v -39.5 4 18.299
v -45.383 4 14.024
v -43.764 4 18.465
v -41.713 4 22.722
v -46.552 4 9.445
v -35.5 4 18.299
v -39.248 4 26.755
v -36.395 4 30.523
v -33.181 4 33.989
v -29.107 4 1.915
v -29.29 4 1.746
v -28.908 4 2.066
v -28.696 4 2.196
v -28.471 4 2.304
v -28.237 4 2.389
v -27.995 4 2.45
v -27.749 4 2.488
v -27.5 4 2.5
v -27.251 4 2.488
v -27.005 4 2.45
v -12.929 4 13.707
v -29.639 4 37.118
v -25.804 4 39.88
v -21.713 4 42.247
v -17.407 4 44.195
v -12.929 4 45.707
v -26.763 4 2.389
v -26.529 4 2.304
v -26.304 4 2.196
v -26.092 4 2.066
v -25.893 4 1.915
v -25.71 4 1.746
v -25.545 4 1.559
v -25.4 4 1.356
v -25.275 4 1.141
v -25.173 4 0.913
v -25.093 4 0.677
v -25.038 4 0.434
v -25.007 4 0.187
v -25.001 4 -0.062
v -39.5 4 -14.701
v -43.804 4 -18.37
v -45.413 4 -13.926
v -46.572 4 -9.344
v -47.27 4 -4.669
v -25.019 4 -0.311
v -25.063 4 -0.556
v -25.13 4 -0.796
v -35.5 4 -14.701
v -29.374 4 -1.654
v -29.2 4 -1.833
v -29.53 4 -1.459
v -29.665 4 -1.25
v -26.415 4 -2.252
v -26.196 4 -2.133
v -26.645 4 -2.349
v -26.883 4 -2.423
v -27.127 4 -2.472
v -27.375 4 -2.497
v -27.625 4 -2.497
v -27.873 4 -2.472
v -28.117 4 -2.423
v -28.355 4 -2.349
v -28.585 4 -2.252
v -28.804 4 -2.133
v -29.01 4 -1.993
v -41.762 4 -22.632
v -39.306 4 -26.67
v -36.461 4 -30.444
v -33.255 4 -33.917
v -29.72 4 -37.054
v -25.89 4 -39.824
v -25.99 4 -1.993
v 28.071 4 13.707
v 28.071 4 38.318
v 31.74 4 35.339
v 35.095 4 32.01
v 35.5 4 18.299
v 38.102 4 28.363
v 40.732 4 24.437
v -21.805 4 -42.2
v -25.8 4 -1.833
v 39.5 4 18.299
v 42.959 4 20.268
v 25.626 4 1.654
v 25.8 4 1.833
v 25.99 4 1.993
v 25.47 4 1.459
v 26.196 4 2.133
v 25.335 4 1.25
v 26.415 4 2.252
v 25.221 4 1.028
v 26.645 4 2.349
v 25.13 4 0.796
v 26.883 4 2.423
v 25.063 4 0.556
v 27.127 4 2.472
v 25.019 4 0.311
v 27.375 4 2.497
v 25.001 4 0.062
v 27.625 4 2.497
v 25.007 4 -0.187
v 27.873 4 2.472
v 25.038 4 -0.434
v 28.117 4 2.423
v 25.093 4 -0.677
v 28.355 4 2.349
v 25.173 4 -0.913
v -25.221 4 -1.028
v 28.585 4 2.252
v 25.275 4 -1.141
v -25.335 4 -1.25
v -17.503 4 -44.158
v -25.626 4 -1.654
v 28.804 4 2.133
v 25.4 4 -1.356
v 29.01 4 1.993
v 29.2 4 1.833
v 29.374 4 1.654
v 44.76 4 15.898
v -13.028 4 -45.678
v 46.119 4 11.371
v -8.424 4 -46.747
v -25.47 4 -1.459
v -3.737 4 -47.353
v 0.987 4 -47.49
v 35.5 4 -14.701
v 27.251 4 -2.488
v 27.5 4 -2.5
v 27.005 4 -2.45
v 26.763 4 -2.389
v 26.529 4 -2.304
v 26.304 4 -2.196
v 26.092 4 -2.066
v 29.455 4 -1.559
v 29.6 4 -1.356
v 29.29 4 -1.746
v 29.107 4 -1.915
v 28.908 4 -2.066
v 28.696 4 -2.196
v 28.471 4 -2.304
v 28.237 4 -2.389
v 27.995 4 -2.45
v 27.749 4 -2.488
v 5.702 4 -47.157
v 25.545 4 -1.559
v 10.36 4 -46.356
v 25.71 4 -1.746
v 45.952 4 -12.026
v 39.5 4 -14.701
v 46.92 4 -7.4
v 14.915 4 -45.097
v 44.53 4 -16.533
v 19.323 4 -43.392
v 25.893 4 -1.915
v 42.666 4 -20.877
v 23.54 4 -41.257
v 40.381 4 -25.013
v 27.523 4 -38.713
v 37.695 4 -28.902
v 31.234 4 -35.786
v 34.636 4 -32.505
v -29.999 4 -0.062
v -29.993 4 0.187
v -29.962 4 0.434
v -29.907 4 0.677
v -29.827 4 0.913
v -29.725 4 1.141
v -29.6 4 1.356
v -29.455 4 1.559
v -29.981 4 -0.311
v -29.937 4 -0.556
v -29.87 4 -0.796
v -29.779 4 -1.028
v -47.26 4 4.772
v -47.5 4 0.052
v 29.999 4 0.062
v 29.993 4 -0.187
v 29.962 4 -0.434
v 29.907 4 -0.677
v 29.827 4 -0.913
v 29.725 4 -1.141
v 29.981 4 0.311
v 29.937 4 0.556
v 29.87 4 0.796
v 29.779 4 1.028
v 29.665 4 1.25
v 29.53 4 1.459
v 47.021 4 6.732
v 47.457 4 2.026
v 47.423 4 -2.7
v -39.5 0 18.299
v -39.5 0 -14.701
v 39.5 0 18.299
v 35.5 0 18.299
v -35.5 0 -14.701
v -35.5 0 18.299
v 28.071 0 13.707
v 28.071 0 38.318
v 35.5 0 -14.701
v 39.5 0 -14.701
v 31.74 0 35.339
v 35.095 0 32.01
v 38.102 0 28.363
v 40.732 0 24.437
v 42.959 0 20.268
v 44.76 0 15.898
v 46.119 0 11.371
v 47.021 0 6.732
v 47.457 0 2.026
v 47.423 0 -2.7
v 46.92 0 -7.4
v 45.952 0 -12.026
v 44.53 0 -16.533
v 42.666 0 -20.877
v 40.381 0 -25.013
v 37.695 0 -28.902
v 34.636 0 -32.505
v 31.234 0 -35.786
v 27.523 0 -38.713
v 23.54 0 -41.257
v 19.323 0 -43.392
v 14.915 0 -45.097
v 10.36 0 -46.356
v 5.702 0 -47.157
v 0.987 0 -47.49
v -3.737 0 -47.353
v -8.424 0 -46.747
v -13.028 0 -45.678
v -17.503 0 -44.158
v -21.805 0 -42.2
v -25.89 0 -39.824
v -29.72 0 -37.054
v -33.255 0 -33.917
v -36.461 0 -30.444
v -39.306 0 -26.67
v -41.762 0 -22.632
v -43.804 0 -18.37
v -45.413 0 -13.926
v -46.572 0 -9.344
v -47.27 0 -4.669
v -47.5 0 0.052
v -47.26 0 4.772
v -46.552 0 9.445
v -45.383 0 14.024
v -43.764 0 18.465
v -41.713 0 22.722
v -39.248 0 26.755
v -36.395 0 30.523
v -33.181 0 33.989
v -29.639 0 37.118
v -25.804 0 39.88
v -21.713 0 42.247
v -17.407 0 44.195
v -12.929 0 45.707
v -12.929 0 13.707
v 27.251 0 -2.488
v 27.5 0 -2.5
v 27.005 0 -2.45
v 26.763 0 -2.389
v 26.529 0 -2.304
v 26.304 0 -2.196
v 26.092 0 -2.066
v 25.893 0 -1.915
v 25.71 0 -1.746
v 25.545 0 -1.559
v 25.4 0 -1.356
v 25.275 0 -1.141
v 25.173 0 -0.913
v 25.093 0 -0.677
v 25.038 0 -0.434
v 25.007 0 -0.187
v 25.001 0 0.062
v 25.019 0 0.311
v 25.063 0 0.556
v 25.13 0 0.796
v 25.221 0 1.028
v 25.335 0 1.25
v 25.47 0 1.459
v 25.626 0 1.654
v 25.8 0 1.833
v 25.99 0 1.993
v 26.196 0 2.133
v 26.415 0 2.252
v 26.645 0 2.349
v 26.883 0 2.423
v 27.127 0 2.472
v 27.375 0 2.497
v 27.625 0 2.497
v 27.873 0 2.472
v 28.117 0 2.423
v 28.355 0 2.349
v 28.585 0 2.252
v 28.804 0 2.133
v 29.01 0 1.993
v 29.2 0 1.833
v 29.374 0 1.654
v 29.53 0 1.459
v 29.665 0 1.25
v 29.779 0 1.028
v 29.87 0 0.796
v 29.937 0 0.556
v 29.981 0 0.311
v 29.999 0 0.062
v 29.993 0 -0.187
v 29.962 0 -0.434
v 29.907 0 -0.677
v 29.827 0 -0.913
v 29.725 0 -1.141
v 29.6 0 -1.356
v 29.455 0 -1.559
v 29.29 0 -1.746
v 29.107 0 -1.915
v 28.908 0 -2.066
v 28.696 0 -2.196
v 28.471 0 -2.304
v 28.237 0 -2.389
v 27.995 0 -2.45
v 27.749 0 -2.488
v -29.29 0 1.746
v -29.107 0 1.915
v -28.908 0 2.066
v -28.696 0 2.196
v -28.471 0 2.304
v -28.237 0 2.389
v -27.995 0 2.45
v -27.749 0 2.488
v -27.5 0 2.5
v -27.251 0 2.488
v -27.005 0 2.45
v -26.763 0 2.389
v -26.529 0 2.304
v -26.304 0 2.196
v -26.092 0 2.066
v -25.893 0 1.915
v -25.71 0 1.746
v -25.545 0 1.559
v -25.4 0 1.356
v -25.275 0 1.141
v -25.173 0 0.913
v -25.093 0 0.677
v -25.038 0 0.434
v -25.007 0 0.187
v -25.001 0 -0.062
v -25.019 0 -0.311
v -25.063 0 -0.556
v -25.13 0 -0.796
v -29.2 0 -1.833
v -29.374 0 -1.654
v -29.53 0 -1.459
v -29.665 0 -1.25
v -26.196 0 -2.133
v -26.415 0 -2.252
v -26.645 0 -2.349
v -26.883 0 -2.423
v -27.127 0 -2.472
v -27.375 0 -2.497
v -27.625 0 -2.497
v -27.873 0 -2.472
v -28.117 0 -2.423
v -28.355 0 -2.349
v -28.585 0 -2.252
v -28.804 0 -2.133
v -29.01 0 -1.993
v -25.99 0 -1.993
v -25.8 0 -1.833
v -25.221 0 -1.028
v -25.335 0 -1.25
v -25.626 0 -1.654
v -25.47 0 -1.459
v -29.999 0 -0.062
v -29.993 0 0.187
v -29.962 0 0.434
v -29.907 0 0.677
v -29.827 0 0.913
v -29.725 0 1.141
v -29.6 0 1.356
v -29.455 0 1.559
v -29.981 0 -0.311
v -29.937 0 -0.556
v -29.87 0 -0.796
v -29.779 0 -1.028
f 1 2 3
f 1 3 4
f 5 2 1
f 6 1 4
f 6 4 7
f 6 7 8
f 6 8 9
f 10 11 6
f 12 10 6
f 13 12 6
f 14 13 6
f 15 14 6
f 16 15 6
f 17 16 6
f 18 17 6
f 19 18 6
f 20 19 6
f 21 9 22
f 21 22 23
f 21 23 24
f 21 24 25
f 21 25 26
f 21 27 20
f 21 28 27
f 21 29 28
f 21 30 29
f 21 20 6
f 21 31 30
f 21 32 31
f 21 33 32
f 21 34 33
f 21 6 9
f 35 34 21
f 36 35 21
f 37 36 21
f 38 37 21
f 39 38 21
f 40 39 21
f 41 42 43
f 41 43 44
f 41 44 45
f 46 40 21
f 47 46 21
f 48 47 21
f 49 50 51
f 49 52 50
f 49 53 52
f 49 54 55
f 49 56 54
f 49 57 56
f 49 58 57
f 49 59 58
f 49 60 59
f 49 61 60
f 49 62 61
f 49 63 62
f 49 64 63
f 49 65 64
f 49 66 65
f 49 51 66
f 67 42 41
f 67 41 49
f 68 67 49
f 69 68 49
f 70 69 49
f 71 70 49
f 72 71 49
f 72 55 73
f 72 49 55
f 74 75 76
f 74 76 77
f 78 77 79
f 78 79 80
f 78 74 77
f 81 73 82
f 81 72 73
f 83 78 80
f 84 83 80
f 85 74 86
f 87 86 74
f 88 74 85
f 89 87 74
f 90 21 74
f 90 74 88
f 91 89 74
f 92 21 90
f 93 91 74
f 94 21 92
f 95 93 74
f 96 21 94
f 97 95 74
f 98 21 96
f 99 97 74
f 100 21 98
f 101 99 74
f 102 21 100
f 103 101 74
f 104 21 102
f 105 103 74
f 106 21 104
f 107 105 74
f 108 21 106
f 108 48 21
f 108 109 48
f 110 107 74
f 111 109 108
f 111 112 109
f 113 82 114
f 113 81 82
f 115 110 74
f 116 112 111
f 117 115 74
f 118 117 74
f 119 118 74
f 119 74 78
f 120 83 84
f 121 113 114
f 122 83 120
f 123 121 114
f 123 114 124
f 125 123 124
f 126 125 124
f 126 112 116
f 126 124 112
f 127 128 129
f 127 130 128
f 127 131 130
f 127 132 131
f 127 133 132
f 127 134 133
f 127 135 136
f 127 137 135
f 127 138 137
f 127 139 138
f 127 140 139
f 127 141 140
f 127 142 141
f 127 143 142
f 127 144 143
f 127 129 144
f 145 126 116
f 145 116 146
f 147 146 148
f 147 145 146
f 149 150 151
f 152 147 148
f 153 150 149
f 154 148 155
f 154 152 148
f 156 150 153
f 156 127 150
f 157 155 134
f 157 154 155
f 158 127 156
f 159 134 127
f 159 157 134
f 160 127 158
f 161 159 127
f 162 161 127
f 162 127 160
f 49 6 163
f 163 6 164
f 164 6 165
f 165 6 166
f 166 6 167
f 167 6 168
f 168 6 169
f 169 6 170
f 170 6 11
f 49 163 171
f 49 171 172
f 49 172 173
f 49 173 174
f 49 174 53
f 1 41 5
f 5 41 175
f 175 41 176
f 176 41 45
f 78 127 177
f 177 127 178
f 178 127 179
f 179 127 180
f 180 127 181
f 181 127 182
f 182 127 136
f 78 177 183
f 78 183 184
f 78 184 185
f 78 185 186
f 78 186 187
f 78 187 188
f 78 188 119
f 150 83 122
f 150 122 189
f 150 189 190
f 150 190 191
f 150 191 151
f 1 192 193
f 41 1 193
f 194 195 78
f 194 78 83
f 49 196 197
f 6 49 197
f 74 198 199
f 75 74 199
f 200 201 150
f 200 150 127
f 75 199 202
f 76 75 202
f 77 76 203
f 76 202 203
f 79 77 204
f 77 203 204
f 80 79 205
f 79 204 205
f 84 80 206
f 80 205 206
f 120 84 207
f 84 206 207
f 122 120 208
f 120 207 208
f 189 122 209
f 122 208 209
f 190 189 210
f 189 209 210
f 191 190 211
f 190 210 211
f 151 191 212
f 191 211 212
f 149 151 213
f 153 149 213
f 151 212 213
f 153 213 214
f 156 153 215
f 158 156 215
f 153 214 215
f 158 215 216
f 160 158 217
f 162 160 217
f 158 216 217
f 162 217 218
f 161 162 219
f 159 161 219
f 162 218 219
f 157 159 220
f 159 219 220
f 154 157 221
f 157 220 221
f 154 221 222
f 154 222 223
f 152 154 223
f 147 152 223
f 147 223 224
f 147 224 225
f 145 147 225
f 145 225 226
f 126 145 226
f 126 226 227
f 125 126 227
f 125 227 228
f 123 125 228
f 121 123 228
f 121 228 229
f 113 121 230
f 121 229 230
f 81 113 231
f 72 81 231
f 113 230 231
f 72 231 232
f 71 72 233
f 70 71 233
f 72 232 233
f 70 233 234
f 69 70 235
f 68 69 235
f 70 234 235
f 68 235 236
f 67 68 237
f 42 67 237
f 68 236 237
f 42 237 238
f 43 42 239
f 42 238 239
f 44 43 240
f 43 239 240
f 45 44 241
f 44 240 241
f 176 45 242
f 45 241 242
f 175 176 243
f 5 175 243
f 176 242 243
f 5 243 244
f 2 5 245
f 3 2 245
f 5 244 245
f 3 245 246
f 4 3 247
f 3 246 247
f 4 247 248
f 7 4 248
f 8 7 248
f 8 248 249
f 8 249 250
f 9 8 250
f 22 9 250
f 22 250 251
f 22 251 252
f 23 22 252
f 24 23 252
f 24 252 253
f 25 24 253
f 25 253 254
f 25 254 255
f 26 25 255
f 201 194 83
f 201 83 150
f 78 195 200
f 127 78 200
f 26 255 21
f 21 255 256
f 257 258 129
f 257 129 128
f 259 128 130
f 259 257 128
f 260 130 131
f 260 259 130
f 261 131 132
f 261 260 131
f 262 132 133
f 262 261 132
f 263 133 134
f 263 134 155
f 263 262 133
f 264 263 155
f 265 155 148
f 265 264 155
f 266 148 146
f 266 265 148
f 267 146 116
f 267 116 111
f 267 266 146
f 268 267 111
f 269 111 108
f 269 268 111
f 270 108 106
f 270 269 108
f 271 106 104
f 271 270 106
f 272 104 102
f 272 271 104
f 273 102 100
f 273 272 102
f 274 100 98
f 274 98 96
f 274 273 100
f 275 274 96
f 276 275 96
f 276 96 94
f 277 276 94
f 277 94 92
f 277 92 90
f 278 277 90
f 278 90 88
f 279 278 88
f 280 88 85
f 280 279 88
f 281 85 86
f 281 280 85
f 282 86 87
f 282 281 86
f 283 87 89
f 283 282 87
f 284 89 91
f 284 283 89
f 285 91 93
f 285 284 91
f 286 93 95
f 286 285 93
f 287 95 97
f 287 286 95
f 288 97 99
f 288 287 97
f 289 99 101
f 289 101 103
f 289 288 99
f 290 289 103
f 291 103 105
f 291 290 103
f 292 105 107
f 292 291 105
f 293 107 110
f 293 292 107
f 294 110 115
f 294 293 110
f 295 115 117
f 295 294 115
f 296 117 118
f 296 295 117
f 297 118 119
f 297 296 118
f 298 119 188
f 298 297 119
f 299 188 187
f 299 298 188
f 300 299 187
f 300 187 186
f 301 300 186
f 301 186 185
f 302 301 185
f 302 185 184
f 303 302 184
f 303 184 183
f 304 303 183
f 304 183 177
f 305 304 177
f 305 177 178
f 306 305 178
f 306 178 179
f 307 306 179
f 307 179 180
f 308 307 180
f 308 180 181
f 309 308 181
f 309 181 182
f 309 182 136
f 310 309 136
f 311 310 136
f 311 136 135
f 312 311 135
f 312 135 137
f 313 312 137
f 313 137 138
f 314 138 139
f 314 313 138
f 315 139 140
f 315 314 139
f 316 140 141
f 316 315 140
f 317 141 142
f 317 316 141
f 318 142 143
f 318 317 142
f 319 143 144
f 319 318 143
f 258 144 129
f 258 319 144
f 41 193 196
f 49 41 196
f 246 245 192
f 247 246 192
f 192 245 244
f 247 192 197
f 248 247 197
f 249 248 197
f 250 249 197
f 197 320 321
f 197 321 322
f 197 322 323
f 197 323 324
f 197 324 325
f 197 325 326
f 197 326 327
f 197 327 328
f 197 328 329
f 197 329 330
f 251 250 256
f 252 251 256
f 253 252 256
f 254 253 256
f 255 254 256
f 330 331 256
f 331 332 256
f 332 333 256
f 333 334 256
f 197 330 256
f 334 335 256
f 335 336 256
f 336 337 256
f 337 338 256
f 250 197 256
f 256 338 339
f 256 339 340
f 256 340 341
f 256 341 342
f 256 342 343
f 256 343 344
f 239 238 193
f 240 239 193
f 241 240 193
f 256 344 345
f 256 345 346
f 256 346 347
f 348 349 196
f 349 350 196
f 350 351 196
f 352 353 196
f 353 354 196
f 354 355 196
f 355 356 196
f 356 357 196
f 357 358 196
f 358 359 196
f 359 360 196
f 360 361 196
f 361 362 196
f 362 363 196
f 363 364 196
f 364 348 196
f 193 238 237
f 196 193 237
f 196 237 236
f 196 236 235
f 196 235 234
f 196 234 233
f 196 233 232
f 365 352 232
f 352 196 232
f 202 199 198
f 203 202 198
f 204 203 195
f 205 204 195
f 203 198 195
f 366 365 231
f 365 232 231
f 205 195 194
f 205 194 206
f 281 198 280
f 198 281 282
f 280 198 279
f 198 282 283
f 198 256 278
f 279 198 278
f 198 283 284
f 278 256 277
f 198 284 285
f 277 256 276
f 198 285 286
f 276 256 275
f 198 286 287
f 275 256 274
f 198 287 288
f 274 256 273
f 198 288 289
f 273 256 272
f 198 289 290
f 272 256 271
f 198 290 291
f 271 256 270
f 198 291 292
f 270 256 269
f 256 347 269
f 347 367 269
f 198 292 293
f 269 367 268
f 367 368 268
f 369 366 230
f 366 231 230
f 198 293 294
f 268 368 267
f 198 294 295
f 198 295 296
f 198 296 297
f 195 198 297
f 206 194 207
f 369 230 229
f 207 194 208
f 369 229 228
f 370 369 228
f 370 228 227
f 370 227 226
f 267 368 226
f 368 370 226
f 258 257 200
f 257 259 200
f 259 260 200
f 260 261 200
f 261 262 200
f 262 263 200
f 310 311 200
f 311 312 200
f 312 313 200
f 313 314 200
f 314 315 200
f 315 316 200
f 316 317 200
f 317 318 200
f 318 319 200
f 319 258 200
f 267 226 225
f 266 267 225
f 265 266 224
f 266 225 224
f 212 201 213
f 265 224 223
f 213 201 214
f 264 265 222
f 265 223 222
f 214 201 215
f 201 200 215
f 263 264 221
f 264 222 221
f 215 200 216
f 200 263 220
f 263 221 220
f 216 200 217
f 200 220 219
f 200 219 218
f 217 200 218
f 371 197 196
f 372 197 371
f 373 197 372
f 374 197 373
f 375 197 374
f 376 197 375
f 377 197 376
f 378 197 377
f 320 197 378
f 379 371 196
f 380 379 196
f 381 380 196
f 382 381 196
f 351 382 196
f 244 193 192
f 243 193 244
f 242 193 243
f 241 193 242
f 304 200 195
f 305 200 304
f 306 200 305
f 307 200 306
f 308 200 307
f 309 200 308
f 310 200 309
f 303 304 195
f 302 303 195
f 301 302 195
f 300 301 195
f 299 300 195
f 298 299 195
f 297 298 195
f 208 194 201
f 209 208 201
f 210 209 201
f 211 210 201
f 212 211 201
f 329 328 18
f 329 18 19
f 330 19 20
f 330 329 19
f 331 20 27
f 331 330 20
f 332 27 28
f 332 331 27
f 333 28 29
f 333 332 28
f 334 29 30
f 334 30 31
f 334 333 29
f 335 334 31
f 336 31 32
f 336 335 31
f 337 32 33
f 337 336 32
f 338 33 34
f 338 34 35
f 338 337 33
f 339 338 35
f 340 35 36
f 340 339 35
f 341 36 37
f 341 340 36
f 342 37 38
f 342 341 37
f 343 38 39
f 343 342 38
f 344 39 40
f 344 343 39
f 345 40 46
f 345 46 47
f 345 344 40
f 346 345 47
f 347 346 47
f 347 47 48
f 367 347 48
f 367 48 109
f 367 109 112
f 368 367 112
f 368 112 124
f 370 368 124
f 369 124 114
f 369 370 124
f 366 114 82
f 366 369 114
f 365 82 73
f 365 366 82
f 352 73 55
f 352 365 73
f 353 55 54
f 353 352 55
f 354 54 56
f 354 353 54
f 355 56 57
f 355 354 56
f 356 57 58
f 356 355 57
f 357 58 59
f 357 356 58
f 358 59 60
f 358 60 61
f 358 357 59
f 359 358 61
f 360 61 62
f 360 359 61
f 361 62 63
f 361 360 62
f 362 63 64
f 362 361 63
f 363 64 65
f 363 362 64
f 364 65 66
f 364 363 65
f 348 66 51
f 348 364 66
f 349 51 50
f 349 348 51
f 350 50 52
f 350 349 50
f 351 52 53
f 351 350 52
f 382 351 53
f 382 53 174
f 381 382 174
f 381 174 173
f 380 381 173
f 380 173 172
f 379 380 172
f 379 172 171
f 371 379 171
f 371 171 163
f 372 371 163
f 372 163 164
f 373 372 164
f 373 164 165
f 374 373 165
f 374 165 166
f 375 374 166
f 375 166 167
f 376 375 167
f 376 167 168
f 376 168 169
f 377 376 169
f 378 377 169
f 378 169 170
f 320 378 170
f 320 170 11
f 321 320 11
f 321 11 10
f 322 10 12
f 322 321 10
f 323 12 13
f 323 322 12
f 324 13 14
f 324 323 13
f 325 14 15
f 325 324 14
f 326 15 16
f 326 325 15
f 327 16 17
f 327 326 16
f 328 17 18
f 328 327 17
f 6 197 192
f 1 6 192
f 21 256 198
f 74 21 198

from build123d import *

# Parameters (mm, degrees)
SKETCH1_R           = 2.5
BOSS_EXTRUDE2_DEPTH = 4


with BuildPart() as part:
    # Sketch1 → Boss-Extrude2 (new body)
    with BuildSketch(Plane(origin=(0, 0, 0), x_dir=(1, 0, 0), z_dir=(0, 1, 0))):
        with BuildLine():
            Line((-12.928995443, -45.70657586), (-12.928995443, -13.70657586))
            Line((-12.928995443, -13.70657586), (28.071004557, -13.70657586))
            Line((28.071004557, -13.70657586), (28.071004557, -38.317994509))
            ThreePointArc((28.071004557, -38.317994509), (-8.424244393, 46.747001042), (-12.928995443, -45.70657586))
        make_face()
        with Locations(Location((-27.5, 0, 0), (0, 0, 270))):
            Circle(SKETCH1_R, mode=Mode.SUBTRACT)
        with Locations(Location((27.5, 0, 0), (0, 0, 90))):
            Circle(SKETCH1_R, mode=Mode.SUBTRACT)
        Polygon((35.5, -18.298658927), (39.5, -18.298658927), (39.5, 14.701341073), (35.5, 14.701341073), (35.5, 9.151429429), align=None, mode=Mode.SUBTRACT)
        Polygon((-35.5, -18.298658927), (-39.5, -18.298658927), (-39.5, 14.701341073), (-35.5, 14.701341073), (-35.5, 9.151429429), align=None, mode=Mode.SUBTRACT)
    extrude(amount=BOSS_EXTRUDE2_DEPTH)


solid = part.part
